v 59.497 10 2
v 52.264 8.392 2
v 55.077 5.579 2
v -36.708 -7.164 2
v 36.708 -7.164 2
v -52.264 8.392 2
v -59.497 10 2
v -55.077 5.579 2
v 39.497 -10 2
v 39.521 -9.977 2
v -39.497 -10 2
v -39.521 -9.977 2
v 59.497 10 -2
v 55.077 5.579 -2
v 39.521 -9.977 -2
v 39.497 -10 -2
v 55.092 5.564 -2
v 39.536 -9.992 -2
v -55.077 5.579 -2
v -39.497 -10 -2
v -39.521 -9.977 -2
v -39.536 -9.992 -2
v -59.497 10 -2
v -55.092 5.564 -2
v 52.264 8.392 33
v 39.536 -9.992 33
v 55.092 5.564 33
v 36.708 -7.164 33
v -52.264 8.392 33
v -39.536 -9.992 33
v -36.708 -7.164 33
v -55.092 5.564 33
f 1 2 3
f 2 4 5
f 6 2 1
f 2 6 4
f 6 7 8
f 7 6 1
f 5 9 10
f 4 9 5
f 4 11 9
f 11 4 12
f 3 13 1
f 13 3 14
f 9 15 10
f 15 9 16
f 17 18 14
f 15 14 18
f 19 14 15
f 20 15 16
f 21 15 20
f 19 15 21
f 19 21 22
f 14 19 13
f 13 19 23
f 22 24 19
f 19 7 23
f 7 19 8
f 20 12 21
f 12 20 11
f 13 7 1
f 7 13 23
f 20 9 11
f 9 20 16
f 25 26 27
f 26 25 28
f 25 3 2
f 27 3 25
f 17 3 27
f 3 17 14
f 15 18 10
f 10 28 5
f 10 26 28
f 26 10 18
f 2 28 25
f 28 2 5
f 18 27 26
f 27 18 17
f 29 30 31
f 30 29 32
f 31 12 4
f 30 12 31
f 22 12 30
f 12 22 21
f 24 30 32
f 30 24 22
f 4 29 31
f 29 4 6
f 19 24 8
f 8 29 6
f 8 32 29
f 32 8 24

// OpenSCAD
thickness = 4.0;

module mainFrame(){
    cube([120,20,thickness],center=true);
}
 
 module cutter(){
    rotate([0, 0, 45]) {
        translate(v = [45, -45, 0]) {  
            cube([50, 20, thickness], center=true);
        }
    }
}

module cutters(){
    cutter();
    mirror(v= [180, 0, 0] ) {
        cutter();
    }
}

module frameCutted(){
    difference() {
        mainFrame();
        cutters();
    }
}

module holder(){
    translate(v = [45.9, -0.8, 15.5]) {  
        rotate([0, 0, 45]) {
            cube([22, thickness, 35], center=true);
        }
    }
}

module holders(){
    holder();
     mirror(v= [180, 0, 0] ) {
        holder();
    }
}

union (){
    frameCutted();
    holders();
}
   
